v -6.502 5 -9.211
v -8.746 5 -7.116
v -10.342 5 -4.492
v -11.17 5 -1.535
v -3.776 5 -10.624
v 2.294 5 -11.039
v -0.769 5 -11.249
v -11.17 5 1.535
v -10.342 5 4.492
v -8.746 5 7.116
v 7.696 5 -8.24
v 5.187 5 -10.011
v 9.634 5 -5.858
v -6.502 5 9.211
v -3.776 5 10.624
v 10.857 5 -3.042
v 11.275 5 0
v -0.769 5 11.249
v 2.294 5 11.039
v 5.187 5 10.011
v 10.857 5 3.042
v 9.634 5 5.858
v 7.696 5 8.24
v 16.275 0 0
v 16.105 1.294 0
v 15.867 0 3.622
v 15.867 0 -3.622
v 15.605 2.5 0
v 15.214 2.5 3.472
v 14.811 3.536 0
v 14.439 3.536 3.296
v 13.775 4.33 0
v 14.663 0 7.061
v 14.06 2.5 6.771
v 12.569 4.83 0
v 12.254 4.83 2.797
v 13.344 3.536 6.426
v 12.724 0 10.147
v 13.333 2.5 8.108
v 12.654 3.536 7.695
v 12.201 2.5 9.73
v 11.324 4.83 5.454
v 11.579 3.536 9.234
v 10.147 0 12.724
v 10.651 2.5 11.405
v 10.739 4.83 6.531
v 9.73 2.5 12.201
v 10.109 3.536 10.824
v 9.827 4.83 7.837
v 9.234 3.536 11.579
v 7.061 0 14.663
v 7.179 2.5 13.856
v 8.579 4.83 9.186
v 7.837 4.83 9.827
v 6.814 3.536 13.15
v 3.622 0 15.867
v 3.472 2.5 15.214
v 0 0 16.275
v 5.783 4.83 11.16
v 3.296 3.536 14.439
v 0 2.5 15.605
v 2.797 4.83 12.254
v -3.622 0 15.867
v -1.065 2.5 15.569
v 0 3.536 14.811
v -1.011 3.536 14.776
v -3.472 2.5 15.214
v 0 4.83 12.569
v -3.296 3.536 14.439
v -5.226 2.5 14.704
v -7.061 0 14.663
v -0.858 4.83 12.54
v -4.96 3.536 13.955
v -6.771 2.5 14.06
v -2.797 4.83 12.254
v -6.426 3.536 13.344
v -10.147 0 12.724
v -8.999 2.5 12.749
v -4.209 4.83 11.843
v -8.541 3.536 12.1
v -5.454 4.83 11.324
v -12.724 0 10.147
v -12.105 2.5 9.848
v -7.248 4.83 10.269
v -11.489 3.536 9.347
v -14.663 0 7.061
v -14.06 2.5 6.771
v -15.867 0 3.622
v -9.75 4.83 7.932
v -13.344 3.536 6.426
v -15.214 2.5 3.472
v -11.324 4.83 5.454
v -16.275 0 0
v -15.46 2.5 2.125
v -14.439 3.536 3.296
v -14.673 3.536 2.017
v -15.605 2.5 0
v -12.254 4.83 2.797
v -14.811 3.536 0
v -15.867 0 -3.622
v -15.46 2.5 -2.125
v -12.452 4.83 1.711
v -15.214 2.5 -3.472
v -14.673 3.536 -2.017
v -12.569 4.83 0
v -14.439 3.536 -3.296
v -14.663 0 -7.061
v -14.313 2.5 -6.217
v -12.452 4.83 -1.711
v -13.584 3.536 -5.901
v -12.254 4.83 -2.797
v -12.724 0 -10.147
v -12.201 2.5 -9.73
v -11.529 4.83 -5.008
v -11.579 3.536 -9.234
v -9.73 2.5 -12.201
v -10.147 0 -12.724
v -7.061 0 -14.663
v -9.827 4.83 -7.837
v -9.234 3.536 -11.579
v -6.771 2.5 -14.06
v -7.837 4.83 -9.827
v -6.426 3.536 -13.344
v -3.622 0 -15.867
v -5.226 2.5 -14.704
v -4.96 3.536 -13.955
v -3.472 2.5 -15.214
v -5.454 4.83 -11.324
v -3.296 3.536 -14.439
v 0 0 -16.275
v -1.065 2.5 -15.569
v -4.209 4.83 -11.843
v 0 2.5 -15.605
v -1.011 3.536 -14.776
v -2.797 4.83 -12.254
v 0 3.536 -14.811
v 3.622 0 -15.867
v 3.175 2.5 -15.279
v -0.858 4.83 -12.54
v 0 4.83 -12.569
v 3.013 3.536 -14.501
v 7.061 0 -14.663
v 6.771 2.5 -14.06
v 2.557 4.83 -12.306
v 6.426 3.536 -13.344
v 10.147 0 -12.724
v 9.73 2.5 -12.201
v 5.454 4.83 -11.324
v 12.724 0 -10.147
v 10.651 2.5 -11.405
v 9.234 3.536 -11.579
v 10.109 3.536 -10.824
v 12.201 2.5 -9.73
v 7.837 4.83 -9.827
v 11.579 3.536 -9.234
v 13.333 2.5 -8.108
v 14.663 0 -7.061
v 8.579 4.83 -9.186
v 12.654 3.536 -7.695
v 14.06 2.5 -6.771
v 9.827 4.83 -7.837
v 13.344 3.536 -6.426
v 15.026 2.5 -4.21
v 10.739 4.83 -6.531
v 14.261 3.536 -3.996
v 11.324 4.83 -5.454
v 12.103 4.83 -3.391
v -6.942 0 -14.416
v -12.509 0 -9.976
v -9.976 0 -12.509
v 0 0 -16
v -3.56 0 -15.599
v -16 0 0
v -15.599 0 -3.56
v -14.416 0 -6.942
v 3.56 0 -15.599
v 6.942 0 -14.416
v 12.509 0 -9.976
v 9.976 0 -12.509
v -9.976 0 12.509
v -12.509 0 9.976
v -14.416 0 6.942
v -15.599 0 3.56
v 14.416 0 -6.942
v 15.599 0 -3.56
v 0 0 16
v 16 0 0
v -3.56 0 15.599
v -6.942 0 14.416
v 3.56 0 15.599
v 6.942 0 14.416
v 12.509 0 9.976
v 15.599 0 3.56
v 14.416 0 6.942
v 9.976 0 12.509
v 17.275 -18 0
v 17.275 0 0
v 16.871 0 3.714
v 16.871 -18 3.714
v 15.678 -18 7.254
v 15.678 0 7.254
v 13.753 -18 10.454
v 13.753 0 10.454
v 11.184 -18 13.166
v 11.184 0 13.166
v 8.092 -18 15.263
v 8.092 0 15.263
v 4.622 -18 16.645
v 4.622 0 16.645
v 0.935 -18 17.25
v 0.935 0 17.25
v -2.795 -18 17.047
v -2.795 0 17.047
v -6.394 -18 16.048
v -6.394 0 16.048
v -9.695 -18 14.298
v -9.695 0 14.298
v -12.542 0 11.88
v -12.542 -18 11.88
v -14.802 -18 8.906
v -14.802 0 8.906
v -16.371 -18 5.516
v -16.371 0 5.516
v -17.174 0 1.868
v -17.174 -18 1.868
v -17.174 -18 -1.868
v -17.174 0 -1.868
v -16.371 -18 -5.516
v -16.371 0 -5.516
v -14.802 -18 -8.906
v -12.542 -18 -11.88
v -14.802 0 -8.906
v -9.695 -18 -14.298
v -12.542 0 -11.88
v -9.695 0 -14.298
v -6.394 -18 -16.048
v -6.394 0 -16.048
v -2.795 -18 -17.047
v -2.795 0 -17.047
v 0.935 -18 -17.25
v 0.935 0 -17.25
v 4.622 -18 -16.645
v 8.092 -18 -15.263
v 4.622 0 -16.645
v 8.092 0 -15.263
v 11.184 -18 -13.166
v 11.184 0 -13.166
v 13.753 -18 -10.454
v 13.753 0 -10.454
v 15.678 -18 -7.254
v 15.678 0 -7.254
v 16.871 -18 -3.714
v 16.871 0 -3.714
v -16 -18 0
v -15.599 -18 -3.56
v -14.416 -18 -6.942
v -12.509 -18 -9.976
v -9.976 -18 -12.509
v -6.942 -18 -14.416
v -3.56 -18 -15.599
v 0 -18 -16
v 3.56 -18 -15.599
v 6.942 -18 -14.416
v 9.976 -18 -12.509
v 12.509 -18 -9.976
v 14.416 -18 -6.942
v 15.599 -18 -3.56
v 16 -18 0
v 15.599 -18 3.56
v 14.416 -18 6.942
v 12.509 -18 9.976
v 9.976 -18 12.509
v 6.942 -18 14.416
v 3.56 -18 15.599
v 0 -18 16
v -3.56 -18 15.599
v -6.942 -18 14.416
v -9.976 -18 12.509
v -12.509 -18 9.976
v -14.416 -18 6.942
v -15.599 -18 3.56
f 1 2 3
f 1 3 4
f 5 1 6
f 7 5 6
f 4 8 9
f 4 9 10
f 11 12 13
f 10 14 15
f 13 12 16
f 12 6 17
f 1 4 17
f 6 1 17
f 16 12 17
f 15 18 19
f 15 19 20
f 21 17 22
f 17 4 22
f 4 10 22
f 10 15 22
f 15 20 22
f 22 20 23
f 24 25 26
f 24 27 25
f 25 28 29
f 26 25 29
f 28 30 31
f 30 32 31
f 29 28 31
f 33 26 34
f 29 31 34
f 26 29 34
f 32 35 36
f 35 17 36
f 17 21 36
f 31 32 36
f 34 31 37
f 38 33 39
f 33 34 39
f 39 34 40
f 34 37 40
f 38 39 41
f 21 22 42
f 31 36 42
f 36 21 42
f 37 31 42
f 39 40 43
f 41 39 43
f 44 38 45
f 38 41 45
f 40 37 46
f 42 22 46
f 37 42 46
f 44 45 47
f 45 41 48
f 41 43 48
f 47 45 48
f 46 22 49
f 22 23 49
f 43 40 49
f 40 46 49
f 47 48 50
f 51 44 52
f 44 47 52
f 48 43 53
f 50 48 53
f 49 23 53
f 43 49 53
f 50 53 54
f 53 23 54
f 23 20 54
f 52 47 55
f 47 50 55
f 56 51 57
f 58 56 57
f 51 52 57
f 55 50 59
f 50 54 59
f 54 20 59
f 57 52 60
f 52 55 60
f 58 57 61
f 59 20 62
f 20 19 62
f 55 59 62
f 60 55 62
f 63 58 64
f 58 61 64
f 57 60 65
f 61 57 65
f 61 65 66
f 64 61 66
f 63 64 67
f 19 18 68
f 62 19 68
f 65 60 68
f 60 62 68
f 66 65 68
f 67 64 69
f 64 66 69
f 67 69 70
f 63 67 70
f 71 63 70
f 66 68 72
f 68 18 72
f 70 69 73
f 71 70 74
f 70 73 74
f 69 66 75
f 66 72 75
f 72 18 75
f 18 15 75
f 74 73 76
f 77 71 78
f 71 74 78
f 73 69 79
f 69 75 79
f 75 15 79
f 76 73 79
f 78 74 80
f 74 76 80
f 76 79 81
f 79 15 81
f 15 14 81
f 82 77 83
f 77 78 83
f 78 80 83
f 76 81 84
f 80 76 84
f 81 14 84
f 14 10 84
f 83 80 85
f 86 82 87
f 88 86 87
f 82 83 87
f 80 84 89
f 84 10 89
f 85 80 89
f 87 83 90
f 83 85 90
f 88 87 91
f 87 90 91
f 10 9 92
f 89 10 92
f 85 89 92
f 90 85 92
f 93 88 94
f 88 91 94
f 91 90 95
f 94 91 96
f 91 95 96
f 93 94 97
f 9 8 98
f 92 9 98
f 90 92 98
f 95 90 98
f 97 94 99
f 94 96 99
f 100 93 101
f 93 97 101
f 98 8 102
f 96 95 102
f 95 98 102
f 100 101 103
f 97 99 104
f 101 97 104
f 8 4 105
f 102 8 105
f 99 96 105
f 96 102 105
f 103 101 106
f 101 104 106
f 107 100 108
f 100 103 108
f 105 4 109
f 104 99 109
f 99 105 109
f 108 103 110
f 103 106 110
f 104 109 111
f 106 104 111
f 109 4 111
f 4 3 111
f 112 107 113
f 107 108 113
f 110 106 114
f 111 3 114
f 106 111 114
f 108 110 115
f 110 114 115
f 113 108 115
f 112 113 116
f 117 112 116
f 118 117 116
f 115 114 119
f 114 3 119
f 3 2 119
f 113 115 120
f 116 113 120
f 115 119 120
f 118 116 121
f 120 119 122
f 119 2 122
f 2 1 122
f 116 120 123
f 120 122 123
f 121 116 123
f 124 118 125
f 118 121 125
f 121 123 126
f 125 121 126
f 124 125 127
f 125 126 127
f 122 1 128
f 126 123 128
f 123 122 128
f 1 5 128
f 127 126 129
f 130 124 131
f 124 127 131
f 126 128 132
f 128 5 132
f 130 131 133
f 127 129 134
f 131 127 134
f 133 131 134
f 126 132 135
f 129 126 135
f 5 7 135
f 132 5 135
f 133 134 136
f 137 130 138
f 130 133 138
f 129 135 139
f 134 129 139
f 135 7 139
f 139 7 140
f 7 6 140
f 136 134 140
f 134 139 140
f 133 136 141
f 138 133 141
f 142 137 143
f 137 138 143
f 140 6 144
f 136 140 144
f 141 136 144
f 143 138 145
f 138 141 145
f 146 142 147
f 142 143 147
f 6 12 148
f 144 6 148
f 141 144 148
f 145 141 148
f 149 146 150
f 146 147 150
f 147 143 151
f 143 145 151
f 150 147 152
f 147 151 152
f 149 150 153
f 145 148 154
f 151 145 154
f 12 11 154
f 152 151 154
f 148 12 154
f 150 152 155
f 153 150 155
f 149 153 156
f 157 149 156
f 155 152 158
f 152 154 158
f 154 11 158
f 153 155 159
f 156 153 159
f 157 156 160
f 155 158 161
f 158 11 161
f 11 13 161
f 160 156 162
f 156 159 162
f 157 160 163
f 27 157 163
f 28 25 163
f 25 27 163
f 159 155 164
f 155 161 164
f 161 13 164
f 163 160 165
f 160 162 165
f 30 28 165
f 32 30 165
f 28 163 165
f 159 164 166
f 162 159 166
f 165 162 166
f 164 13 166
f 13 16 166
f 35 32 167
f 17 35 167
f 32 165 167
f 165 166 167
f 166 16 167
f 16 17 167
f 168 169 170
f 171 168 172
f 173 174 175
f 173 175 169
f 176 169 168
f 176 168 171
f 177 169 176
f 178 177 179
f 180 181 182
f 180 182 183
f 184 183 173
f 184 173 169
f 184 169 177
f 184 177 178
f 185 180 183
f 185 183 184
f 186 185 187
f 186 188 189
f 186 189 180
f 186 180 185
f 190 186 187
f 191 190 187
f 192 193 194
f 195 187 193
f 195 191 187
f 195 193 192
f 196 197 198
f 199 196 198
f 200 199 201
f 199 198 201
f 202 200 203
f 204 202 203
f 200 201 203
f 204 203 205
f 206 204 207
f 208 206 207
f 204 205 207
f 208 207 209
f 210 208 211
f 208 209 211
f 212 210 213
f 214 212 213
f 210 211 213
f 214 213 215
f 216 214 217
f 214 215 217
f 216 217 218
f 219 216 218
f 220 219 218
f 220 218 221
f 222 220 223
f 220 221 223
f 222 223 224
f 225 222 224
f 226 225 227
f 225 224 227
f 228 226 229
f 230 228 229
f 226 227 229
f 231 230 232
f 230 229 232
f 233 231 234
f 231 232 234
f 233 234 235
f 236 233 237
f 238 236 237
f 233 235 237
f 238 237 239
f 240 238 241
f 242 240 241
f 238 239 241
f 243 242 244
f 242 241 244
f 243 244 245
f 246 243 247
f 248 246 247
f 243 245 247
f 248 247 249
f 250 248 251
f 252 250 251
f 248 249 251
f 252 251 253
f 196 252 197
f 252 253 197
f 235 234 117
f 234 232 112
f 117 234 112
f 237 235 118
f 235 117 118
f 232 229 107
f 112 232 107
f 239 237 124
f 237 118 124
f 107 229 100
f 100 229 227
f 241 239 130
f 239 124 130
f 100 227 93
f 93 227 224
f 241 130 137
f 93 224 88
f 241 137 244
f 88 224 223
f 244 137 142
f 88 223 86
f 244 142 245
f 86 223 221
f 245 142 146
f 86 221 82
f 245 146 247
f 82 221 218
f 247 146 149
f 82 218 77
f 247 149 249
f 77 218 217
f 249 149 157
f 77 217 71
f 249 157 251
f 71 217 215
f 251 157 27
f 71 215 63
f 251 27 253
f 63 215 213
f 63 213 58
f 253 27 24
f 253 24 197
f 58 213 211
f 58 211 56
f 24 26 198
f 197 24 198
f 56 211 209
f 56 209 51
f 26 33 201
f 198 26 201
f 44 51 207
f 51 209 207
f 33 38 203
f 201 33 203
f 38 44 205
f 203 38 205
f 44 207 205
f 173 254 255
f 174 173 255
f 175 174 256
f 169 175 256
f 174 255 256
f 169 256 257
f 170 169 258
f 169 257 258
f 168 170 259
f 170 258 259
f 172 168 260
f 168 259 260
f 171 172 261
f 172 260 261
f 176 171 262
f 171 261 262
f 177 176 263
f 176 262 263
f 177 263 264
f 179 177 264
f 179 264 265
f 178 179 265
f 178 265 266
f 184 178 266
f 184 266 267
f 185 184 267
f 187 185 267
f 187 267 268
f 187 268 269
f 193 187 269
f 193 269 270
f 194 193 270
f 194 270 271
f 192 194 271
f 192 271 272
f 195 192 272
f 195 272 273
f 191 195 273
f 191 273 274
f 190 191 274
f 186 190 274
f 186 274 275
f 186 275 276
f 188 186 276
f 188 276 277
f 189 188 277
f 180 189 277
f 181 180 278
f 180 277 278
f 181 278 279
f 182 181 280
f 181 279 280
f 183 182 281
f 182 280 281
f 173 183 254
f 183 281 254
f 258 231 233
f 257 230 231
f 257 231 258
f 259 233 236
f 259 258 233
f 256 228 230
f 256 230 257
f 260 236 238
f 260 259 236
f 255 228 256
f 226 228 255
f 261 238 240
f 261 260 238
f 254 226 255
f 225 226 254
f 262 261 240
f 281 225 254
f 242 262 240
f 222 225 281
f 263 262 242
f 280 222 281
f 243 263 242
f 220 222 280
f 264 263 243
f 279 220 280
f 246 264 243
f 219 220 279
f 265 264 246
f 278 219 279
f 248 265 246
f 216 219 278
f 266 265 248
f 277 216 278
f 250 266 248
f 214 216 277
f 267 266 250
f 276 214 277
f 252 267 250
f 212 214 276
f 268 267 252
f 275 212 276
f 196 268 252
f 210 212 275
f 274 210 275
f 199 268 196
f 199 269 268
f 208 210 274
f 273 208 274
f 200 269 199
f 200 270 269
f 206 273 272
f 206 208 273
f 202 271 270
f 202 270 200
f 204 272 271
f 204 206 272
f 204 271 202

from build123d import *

# Parameters (mm, degrees)
F0_R     = 17.275
F1_DEPTH = 18
F3_D     = 32
F4_R     = 16.275
F5_DEPTH = 5
F6_R     = 4.99999


# Not quite as in the source:
# - a fillet or chamfer is up to 0.001 mm smaller than in the source, because OpenCascade refuses the exact size


with BuildPart() as f1:
    # F0 (on Front) → F1 (new body)
    with BuildSketch(Plane.XZ):
        Circle(F0_R)
    extrude(amount=F1_DEPTH)

    # F3 (through all)
    with Locations(Plane(origin=(0, 0, 0), x_dir=(1, 0, 0), z_dir=(0, 1, 0))):
        with Locations((0, 0)):
            Hole(F3_D / 2)

    # F4 (on Front) → F5 (join)
    with BuildSketch(Plane.XZ):
        Circle(F4_R)
    extrude(amount=-F5_DEPTH)

    # F6 (radius 5 in the source; OpenCascade refuses exactly that, so slightly less here)
    f6_edges = [f1.edges().sort_by_distance(p)[0] for p in [
        (-16.275, 5, 0),
    ]]
    fillet(f6_edges, radius=F6_R)


solid = f1.part
